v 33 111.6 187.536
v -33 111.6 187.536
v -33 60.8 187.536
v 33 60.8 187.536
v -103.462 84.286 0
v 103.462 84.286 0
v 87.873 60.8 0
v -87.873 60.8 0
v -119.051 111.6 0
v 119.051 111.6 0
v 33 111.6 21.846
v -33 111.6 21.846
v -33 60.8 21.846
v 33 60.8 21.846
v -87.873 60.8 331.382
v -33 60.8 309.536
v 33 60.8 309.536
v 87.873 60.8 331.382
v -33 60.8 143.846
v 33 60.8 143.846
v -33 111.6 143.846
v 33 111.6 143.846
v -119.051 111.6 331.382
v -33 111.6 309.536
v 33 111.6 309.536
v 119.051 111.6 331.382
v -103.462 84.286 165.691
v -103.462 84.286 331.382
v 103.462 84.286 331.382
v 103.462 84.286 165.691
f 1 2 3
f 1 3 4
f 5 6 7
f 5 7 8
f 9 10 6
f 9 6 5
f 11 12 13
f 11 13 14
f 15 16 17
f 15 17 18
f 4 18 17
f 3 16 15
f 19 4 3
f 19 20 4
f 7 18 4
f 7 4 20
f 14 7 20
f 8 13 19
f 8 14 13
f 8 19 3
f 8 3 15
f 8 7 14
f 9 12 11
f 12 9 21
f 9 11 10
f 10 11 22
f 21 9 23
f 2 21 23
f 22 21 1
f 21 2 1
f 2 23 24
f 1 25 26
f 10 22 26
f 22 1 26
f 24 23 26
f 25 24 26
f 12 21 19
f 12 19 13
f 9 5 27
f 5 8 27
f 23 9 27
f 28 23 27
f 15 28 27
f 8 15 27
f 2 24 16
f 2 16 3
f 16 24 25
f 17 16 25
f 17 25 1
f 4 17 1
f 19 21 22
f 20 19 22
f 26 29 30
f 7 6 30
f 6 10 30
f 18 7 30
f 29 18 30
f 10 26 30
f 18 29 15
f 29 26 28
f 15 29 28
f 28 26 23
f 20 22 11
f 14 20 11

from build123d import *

# Parameters (mm, degrees)
BOSS_EXTRUDE2_DEPTH = 331.382
SKETCH3_W           = 66
SKETCH3_H           = 122
CUT_EXTRUDE2_DEPTH  = 128.0000001
SKETCH4_W           = 180
SKETCH4_H           = 60.8
CUT_EXTRUDE3_DEPTH  = 332.3820001
SKETCH5_W           = 260
SKETCH5_H           = 20
CUT_EXTRUDE4_DEPTH  = 332.3820001


with BuildPart() as part:
    # Sketch2 → Boss-Extrude2 (new body)
    with BuildSketch(Plane.XY):
        with BuildLine():
            Line((-127, 127), (127, 127))
            add(Edge.make_bspline(
                [(-127, 127), (0, -127), (127, 127)],
                knots=[0.056028396, 0.056028396, 0.056028396, 0.943971604, 0.943971604, 0.943971604], degree=2))
        make_face()
    extrude(amount=BOSS_EXTRUDE2_DEPTH)

    # Sketch3 → Cut-Extrude2 (cut, through all)
    with BuildSketch(Plane(origin=(0, 127, 0), x_dir=(1, 0, 0), z_dir=(0, 1, 0))):
        with Locations((0, -82.8455)):
            Rectangle(SKETCH3_W, SKETCH3_H)
        with Locations((0, -248.5365)):
            Rectangle(SKETCH3_W, SKETCH3_H)
    extrude(amount=-CUT_EXTRUDE2_DEPTH, mode=Mode.SUBTRACT)

    # Sketch4 → Cut-Extrude3 (cut, through all)
    with BuildSketch(Plane(origin=(0, 0, 0), x_dir=(-1, 0, 0), z_dir=(0, 0, -1))):
        with Locations((0, 30.4)):
            Rectangle(SKETCH4_W, SKETCH4_H)
    extrude(amount=-CUT_EXTRUDE3_DEPTH, mode=Mode.SUBTRACT)

    # Sketch5 → Cut-Extrude4 (cut, through all)
    with BuildSketch(Plane.XY.offset(331.382)):
        with Locations((0, 121.6)):
            Rectangle(SKETCH5_W, SKETCH5_H)
    extrude(amount=-CUT_EXTRUDE4_DEPTH, mode=Mode.SUBTRACT)


solid = part.part
